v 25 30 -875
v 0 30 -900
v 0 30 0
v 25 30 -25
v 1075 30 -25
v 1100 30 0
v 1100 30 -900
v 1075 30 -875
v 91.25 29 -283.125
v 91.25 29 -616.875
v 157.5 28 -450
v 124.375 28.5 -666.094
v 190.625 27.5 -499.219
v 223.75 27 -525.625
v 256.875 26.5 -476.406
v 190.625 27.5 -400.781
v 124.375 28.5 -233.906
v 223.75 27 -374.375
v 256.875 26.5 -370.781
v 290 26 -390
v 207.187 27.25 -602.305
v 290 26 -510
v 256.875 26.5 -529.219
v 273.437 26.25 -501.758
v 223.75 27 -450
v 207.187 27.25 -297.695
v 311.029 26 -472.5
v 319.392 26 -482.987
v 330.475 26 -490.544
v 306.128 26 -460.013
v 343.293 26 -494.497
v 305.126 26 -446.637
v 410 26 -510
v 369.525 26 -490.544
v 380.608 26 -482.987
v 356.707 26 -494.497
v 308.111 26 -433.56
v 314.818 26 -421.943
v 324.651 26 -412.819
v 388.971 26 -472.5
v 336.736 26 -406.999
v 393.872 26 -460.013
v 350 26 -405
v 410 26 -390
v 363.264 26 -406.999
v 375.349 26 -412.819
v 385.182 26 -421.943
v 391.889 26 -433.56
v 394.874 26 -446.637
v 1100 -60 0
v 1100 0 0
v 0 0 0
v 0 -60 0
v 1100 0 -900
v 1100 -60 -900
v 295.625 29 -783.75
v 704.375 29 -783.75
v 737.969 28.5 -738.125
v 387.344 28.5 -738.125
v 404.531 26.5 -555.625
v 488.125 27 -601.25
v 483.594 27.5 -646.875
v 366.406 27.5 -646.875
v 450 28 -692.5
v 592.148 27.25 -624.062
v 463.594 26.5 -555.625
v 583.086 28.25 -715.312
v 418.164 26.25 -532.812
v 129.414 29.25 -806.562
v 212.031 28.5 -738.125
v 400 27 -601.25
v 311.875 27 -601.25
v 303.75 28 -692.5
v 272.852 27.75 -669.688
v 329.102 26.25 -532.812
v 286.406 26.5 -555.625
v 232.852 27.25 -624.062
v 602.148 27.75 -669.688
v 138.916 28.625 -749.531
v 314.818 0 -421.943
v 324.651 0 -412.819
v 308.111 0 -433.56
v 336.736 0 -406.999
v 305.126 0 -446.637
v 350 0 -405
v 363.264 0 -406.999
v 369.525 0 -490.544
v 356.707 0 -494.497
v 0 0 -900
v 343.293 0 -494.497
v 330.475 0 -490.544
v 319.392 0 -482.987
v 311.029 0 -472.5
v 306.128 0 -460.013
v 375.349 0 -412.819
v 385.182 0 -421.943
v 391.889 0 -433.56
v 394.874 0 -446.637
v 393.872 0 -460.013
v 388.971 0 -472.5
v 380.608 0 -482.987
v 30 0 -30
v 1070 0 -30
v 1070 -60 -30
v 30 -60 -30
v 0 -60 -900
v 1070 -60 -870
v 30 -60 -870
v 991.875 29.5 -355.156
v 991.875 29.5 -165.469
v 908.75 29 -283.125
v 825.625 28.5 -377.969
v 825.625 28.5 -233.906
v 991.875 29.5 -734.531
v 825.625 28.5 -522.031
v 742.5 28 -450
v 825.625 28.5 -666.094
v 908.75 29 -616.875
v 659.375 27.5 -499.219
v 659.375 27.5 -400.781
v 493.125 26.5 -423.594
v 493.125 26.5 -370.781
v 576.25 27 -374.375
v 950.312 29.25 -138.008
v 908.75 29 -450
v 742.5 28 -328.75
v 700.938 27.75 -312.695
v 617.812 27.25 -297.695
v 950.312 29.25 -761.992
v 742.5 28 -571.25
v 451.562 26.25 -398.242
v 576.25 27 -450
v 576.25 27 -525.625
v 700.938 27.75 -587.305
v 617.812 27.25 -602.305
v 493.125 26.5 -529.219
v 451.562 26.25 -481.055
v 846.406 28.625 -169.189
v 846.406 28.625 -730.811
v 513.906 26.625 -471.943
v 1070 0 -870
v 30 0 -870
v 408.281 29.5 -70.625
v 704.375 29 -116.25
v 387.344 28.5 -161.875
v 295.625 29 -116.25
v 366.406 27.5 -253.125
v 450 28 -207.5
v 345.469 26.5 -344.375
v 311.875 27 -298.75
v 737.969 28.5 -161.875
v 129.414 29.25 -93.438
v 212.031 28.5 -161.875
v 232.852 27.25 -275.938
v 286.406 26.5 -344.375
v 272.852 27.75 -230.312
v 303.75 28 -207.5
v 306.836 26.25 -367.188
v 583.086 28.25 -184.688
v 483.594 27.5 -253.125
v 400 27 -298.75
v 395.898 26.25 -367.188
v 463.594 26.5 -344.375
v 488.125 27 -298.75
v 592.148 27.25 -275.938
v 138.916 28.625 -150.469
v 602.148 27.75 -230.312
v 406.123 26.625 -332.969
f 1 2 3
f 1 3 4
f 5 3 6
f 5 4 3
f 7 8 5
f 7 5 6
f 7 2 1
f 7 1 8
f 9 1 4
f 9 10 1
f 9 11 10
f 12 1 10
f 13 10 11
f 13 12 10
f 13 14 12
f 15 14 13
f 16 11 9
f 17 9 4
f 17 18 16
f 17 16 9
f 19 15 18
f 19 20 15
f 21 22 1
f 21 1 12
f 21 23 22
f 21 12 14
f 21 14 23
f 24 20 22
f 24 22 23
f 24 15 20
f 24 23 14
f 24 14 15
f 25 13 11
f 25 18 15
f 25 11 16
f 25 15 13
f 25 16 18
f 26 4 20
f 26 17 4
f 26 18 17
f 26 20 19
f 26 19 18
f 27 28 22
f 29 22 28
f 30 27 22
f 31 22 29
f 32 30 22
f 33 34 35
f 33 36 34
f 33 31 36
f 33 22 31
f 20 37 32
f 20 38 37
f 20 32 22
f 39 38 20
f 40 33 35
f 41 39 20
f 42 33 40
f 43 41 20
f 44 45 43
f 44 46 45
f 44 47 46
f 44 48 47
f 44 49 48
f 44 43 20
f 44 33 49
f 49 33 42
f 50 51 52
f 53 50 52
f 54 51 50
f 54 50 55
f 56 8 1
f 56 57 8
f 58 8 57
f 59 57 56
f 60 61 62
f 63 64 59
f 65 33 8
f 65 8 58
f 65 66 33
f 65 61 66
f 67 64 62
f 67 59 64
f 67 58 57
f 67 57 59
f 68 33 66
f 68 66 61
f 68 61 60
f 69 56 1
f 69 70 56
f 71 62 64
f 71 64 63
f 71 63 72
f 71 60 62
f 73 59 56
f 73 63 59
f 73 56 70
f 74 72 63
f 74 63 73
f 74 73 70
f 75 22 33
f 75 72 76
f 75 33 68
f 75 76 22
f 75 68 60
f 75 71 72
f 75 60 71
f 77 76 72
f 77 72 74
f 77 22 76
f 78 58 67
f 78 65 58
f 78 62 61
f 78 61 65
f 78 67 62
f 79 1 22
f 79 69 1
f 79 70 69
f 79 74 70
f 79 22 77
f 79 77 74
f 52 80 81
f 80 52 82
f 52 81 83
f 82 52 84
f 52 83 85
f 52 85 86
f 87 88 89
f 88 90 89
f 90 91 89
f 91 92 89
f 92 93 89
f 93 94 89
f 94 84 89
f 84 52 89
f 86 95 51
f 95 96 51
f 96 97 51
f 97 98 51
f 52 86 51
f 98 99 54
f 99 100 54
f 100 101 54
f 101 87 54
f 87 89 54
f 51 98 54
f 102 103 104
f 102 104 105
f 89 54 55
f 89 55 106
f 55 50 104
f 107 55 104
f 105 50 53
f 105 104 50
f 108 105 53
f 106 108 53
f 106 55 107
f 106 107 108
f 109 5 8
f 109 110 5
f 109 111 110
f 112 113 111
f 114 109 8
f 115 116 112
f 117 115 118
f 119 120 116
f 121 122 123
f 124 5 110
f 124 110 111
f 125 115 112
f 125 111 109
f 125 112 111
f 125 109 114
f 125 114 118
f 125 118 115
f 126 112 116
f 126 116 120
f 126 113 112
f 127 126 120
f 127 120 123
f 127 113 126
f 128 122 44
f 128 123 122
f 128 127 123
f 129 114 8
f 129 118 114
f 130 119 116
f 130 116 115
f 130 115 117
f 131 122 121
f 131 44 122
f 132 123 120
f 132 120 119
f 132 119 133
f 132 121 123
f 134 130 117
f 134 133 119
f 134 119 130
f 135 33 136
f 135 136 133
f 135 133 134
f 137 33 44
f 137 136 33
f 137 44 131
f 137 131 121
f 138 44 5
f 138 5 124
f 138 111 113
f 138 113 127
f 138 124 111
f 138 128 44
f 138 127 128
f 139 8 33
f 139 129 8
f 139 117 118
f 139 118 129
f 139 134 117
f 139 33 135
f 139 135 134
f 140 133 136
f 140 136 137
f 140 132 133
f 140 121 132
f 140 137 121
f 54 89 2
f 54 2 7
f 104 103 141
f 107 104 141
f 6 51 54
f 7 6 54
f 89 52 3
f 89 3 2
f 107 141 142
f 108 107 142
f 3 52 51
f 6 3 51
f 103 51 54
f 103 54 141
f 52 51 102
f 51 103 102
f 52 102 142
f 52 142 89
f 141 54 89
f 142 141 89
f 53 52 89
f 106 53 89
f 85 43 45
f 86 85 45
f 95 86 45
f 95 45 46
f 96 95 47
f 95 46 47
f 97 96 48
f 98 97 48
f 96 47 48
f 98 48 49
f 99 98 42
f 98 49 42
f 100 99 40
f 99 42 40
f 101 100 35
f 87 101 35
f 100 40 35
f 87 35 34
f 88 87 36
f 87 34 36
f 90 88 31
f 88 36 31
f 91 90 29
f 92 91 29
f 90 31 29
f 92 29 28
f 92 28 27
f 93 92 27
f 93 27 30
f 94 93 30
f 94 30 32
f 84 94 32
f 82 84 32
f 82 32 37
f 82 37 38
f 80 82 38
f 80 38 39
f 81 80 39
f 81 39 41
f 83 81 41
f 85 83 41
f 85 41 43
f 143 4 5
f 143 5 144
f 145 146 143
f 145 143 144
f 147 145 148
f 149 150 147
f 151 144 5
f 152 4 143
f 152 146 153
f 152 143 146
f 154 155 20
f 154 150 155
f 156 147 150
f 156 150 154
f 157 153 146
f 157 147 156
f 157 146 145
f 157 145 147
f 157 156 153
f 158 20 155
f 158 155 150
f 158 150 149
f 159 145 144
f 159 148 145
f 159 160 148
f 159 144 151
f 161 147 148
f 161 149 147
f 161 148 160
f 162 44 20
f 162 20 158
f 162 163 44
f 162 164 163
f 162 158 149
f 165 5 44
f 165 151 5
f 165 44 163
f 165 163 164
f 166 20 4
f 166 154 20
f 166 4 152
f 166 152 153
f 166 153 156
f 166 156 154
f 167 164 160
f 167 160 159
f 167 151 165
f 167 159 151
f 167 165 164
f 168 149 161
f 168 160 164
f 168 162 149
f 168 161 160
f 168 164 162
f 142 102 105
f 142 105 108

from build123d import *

# Parameters (mm, degrees)
SKETCH_1_W          = 1100
SKETCH_1_H          = 900
EXTRUDE_1_DEPTH     = 30
SKETCH_5_R          = 45
CUT_EXTRUDE_4_DEPTH = 1422.504836432
SKETCH_7_W          = 1100
SKETCH_7_H          = 900
SKETCH_7_W_2        = 1040
SKETCH_7_H_2        = 840
EXTRUDE_2_DEPTH     = 60


with BuildPart() as part:
    # Эскиз1 → Бобышка-Вытянуть1 (new body)
    with BuildSketch(Plane(origin=(0, 0, 0), x_dir=(1, 0, 0), z_dir=(0, 1, 0))):
        with Locations((550, 450)):
            Rectangle(SKETCH_1_W, SKETCH_1_H)
    extrude(amount=EXTRUDE_1_DEPTH)

    # Вырез-По сечениям2: read off the stored shape, not the designer's step
    # Вырез-По сечениям2: loft between two sections, ruled curve by curve
    loft_2_from = [
        Edge.make_line((1075, 30, -875), (25, 30, -875)),
        Edge.make_line((25, 30, -875), (25, 30, -25)),
        Edge.make_line((1075, 30, -25), (1075, 30, -875)),
        Edge.make_line((25, 30, -25), (1075, 30, -25)),
    ]
    loft_2_to = [
        Edge.make_line((410, 26, -510), (290, 26, -510)),
        Edge.make_line((290, 26, -510), (290, 26, -390)),
        Edge.make_line((410, 26, -390), (410, 26, -510)),
        Edge.make_line((290, 26, -390), (410, 26, -390)),
    ]
    loft_2 = Solid(Shell([*[Face.make_surface_from_curves(loft_2_from[k], loft_2_to[k]) for k in range(4)], Face(Wire(loft_2_from)), Face(Wire(loft_2_to))]))
    add(loft_2, mode=Mode.SUBTRACT)

    # Эскиз5 → Вырез-Вытянуть4 (cut, through all)
    with BuildSketch(Plane(origin=(0, 26, 0), x_dir=(-1, 0, 0), z_dir=(0, 1, 0))):
        with Locations(Location((-350, -450, 0), (0, 0, 90))):
            Circle(SKETCH_5_R)
    extrude(amount=-CUT_EXTRUDE_4_DEPTH, mode=Mode.SUBTRACT)


with BuildPart() as body_2:
    # Эскиз7 → Бобышка-Вытянуть2 (new body)
    with BuildSketch(Plane(origin=(0, 0, 0), x_dir=(-1, 0, 0), z_dir=(0, -1, 0))):
        with Locations((-550, 450)):
            Rectangle(SKETCH_7_W, SKETCH_7_H)
        with Locations((-550, 450)):
            Rectangle(SKETCH_7_W_2, SKETCH_7_H_2, mode=Mode.SUBTRACT)
    extrude(amount=EXTRUDE_2_DEPTH)


solid = Compound([part.part, body_2.part])
